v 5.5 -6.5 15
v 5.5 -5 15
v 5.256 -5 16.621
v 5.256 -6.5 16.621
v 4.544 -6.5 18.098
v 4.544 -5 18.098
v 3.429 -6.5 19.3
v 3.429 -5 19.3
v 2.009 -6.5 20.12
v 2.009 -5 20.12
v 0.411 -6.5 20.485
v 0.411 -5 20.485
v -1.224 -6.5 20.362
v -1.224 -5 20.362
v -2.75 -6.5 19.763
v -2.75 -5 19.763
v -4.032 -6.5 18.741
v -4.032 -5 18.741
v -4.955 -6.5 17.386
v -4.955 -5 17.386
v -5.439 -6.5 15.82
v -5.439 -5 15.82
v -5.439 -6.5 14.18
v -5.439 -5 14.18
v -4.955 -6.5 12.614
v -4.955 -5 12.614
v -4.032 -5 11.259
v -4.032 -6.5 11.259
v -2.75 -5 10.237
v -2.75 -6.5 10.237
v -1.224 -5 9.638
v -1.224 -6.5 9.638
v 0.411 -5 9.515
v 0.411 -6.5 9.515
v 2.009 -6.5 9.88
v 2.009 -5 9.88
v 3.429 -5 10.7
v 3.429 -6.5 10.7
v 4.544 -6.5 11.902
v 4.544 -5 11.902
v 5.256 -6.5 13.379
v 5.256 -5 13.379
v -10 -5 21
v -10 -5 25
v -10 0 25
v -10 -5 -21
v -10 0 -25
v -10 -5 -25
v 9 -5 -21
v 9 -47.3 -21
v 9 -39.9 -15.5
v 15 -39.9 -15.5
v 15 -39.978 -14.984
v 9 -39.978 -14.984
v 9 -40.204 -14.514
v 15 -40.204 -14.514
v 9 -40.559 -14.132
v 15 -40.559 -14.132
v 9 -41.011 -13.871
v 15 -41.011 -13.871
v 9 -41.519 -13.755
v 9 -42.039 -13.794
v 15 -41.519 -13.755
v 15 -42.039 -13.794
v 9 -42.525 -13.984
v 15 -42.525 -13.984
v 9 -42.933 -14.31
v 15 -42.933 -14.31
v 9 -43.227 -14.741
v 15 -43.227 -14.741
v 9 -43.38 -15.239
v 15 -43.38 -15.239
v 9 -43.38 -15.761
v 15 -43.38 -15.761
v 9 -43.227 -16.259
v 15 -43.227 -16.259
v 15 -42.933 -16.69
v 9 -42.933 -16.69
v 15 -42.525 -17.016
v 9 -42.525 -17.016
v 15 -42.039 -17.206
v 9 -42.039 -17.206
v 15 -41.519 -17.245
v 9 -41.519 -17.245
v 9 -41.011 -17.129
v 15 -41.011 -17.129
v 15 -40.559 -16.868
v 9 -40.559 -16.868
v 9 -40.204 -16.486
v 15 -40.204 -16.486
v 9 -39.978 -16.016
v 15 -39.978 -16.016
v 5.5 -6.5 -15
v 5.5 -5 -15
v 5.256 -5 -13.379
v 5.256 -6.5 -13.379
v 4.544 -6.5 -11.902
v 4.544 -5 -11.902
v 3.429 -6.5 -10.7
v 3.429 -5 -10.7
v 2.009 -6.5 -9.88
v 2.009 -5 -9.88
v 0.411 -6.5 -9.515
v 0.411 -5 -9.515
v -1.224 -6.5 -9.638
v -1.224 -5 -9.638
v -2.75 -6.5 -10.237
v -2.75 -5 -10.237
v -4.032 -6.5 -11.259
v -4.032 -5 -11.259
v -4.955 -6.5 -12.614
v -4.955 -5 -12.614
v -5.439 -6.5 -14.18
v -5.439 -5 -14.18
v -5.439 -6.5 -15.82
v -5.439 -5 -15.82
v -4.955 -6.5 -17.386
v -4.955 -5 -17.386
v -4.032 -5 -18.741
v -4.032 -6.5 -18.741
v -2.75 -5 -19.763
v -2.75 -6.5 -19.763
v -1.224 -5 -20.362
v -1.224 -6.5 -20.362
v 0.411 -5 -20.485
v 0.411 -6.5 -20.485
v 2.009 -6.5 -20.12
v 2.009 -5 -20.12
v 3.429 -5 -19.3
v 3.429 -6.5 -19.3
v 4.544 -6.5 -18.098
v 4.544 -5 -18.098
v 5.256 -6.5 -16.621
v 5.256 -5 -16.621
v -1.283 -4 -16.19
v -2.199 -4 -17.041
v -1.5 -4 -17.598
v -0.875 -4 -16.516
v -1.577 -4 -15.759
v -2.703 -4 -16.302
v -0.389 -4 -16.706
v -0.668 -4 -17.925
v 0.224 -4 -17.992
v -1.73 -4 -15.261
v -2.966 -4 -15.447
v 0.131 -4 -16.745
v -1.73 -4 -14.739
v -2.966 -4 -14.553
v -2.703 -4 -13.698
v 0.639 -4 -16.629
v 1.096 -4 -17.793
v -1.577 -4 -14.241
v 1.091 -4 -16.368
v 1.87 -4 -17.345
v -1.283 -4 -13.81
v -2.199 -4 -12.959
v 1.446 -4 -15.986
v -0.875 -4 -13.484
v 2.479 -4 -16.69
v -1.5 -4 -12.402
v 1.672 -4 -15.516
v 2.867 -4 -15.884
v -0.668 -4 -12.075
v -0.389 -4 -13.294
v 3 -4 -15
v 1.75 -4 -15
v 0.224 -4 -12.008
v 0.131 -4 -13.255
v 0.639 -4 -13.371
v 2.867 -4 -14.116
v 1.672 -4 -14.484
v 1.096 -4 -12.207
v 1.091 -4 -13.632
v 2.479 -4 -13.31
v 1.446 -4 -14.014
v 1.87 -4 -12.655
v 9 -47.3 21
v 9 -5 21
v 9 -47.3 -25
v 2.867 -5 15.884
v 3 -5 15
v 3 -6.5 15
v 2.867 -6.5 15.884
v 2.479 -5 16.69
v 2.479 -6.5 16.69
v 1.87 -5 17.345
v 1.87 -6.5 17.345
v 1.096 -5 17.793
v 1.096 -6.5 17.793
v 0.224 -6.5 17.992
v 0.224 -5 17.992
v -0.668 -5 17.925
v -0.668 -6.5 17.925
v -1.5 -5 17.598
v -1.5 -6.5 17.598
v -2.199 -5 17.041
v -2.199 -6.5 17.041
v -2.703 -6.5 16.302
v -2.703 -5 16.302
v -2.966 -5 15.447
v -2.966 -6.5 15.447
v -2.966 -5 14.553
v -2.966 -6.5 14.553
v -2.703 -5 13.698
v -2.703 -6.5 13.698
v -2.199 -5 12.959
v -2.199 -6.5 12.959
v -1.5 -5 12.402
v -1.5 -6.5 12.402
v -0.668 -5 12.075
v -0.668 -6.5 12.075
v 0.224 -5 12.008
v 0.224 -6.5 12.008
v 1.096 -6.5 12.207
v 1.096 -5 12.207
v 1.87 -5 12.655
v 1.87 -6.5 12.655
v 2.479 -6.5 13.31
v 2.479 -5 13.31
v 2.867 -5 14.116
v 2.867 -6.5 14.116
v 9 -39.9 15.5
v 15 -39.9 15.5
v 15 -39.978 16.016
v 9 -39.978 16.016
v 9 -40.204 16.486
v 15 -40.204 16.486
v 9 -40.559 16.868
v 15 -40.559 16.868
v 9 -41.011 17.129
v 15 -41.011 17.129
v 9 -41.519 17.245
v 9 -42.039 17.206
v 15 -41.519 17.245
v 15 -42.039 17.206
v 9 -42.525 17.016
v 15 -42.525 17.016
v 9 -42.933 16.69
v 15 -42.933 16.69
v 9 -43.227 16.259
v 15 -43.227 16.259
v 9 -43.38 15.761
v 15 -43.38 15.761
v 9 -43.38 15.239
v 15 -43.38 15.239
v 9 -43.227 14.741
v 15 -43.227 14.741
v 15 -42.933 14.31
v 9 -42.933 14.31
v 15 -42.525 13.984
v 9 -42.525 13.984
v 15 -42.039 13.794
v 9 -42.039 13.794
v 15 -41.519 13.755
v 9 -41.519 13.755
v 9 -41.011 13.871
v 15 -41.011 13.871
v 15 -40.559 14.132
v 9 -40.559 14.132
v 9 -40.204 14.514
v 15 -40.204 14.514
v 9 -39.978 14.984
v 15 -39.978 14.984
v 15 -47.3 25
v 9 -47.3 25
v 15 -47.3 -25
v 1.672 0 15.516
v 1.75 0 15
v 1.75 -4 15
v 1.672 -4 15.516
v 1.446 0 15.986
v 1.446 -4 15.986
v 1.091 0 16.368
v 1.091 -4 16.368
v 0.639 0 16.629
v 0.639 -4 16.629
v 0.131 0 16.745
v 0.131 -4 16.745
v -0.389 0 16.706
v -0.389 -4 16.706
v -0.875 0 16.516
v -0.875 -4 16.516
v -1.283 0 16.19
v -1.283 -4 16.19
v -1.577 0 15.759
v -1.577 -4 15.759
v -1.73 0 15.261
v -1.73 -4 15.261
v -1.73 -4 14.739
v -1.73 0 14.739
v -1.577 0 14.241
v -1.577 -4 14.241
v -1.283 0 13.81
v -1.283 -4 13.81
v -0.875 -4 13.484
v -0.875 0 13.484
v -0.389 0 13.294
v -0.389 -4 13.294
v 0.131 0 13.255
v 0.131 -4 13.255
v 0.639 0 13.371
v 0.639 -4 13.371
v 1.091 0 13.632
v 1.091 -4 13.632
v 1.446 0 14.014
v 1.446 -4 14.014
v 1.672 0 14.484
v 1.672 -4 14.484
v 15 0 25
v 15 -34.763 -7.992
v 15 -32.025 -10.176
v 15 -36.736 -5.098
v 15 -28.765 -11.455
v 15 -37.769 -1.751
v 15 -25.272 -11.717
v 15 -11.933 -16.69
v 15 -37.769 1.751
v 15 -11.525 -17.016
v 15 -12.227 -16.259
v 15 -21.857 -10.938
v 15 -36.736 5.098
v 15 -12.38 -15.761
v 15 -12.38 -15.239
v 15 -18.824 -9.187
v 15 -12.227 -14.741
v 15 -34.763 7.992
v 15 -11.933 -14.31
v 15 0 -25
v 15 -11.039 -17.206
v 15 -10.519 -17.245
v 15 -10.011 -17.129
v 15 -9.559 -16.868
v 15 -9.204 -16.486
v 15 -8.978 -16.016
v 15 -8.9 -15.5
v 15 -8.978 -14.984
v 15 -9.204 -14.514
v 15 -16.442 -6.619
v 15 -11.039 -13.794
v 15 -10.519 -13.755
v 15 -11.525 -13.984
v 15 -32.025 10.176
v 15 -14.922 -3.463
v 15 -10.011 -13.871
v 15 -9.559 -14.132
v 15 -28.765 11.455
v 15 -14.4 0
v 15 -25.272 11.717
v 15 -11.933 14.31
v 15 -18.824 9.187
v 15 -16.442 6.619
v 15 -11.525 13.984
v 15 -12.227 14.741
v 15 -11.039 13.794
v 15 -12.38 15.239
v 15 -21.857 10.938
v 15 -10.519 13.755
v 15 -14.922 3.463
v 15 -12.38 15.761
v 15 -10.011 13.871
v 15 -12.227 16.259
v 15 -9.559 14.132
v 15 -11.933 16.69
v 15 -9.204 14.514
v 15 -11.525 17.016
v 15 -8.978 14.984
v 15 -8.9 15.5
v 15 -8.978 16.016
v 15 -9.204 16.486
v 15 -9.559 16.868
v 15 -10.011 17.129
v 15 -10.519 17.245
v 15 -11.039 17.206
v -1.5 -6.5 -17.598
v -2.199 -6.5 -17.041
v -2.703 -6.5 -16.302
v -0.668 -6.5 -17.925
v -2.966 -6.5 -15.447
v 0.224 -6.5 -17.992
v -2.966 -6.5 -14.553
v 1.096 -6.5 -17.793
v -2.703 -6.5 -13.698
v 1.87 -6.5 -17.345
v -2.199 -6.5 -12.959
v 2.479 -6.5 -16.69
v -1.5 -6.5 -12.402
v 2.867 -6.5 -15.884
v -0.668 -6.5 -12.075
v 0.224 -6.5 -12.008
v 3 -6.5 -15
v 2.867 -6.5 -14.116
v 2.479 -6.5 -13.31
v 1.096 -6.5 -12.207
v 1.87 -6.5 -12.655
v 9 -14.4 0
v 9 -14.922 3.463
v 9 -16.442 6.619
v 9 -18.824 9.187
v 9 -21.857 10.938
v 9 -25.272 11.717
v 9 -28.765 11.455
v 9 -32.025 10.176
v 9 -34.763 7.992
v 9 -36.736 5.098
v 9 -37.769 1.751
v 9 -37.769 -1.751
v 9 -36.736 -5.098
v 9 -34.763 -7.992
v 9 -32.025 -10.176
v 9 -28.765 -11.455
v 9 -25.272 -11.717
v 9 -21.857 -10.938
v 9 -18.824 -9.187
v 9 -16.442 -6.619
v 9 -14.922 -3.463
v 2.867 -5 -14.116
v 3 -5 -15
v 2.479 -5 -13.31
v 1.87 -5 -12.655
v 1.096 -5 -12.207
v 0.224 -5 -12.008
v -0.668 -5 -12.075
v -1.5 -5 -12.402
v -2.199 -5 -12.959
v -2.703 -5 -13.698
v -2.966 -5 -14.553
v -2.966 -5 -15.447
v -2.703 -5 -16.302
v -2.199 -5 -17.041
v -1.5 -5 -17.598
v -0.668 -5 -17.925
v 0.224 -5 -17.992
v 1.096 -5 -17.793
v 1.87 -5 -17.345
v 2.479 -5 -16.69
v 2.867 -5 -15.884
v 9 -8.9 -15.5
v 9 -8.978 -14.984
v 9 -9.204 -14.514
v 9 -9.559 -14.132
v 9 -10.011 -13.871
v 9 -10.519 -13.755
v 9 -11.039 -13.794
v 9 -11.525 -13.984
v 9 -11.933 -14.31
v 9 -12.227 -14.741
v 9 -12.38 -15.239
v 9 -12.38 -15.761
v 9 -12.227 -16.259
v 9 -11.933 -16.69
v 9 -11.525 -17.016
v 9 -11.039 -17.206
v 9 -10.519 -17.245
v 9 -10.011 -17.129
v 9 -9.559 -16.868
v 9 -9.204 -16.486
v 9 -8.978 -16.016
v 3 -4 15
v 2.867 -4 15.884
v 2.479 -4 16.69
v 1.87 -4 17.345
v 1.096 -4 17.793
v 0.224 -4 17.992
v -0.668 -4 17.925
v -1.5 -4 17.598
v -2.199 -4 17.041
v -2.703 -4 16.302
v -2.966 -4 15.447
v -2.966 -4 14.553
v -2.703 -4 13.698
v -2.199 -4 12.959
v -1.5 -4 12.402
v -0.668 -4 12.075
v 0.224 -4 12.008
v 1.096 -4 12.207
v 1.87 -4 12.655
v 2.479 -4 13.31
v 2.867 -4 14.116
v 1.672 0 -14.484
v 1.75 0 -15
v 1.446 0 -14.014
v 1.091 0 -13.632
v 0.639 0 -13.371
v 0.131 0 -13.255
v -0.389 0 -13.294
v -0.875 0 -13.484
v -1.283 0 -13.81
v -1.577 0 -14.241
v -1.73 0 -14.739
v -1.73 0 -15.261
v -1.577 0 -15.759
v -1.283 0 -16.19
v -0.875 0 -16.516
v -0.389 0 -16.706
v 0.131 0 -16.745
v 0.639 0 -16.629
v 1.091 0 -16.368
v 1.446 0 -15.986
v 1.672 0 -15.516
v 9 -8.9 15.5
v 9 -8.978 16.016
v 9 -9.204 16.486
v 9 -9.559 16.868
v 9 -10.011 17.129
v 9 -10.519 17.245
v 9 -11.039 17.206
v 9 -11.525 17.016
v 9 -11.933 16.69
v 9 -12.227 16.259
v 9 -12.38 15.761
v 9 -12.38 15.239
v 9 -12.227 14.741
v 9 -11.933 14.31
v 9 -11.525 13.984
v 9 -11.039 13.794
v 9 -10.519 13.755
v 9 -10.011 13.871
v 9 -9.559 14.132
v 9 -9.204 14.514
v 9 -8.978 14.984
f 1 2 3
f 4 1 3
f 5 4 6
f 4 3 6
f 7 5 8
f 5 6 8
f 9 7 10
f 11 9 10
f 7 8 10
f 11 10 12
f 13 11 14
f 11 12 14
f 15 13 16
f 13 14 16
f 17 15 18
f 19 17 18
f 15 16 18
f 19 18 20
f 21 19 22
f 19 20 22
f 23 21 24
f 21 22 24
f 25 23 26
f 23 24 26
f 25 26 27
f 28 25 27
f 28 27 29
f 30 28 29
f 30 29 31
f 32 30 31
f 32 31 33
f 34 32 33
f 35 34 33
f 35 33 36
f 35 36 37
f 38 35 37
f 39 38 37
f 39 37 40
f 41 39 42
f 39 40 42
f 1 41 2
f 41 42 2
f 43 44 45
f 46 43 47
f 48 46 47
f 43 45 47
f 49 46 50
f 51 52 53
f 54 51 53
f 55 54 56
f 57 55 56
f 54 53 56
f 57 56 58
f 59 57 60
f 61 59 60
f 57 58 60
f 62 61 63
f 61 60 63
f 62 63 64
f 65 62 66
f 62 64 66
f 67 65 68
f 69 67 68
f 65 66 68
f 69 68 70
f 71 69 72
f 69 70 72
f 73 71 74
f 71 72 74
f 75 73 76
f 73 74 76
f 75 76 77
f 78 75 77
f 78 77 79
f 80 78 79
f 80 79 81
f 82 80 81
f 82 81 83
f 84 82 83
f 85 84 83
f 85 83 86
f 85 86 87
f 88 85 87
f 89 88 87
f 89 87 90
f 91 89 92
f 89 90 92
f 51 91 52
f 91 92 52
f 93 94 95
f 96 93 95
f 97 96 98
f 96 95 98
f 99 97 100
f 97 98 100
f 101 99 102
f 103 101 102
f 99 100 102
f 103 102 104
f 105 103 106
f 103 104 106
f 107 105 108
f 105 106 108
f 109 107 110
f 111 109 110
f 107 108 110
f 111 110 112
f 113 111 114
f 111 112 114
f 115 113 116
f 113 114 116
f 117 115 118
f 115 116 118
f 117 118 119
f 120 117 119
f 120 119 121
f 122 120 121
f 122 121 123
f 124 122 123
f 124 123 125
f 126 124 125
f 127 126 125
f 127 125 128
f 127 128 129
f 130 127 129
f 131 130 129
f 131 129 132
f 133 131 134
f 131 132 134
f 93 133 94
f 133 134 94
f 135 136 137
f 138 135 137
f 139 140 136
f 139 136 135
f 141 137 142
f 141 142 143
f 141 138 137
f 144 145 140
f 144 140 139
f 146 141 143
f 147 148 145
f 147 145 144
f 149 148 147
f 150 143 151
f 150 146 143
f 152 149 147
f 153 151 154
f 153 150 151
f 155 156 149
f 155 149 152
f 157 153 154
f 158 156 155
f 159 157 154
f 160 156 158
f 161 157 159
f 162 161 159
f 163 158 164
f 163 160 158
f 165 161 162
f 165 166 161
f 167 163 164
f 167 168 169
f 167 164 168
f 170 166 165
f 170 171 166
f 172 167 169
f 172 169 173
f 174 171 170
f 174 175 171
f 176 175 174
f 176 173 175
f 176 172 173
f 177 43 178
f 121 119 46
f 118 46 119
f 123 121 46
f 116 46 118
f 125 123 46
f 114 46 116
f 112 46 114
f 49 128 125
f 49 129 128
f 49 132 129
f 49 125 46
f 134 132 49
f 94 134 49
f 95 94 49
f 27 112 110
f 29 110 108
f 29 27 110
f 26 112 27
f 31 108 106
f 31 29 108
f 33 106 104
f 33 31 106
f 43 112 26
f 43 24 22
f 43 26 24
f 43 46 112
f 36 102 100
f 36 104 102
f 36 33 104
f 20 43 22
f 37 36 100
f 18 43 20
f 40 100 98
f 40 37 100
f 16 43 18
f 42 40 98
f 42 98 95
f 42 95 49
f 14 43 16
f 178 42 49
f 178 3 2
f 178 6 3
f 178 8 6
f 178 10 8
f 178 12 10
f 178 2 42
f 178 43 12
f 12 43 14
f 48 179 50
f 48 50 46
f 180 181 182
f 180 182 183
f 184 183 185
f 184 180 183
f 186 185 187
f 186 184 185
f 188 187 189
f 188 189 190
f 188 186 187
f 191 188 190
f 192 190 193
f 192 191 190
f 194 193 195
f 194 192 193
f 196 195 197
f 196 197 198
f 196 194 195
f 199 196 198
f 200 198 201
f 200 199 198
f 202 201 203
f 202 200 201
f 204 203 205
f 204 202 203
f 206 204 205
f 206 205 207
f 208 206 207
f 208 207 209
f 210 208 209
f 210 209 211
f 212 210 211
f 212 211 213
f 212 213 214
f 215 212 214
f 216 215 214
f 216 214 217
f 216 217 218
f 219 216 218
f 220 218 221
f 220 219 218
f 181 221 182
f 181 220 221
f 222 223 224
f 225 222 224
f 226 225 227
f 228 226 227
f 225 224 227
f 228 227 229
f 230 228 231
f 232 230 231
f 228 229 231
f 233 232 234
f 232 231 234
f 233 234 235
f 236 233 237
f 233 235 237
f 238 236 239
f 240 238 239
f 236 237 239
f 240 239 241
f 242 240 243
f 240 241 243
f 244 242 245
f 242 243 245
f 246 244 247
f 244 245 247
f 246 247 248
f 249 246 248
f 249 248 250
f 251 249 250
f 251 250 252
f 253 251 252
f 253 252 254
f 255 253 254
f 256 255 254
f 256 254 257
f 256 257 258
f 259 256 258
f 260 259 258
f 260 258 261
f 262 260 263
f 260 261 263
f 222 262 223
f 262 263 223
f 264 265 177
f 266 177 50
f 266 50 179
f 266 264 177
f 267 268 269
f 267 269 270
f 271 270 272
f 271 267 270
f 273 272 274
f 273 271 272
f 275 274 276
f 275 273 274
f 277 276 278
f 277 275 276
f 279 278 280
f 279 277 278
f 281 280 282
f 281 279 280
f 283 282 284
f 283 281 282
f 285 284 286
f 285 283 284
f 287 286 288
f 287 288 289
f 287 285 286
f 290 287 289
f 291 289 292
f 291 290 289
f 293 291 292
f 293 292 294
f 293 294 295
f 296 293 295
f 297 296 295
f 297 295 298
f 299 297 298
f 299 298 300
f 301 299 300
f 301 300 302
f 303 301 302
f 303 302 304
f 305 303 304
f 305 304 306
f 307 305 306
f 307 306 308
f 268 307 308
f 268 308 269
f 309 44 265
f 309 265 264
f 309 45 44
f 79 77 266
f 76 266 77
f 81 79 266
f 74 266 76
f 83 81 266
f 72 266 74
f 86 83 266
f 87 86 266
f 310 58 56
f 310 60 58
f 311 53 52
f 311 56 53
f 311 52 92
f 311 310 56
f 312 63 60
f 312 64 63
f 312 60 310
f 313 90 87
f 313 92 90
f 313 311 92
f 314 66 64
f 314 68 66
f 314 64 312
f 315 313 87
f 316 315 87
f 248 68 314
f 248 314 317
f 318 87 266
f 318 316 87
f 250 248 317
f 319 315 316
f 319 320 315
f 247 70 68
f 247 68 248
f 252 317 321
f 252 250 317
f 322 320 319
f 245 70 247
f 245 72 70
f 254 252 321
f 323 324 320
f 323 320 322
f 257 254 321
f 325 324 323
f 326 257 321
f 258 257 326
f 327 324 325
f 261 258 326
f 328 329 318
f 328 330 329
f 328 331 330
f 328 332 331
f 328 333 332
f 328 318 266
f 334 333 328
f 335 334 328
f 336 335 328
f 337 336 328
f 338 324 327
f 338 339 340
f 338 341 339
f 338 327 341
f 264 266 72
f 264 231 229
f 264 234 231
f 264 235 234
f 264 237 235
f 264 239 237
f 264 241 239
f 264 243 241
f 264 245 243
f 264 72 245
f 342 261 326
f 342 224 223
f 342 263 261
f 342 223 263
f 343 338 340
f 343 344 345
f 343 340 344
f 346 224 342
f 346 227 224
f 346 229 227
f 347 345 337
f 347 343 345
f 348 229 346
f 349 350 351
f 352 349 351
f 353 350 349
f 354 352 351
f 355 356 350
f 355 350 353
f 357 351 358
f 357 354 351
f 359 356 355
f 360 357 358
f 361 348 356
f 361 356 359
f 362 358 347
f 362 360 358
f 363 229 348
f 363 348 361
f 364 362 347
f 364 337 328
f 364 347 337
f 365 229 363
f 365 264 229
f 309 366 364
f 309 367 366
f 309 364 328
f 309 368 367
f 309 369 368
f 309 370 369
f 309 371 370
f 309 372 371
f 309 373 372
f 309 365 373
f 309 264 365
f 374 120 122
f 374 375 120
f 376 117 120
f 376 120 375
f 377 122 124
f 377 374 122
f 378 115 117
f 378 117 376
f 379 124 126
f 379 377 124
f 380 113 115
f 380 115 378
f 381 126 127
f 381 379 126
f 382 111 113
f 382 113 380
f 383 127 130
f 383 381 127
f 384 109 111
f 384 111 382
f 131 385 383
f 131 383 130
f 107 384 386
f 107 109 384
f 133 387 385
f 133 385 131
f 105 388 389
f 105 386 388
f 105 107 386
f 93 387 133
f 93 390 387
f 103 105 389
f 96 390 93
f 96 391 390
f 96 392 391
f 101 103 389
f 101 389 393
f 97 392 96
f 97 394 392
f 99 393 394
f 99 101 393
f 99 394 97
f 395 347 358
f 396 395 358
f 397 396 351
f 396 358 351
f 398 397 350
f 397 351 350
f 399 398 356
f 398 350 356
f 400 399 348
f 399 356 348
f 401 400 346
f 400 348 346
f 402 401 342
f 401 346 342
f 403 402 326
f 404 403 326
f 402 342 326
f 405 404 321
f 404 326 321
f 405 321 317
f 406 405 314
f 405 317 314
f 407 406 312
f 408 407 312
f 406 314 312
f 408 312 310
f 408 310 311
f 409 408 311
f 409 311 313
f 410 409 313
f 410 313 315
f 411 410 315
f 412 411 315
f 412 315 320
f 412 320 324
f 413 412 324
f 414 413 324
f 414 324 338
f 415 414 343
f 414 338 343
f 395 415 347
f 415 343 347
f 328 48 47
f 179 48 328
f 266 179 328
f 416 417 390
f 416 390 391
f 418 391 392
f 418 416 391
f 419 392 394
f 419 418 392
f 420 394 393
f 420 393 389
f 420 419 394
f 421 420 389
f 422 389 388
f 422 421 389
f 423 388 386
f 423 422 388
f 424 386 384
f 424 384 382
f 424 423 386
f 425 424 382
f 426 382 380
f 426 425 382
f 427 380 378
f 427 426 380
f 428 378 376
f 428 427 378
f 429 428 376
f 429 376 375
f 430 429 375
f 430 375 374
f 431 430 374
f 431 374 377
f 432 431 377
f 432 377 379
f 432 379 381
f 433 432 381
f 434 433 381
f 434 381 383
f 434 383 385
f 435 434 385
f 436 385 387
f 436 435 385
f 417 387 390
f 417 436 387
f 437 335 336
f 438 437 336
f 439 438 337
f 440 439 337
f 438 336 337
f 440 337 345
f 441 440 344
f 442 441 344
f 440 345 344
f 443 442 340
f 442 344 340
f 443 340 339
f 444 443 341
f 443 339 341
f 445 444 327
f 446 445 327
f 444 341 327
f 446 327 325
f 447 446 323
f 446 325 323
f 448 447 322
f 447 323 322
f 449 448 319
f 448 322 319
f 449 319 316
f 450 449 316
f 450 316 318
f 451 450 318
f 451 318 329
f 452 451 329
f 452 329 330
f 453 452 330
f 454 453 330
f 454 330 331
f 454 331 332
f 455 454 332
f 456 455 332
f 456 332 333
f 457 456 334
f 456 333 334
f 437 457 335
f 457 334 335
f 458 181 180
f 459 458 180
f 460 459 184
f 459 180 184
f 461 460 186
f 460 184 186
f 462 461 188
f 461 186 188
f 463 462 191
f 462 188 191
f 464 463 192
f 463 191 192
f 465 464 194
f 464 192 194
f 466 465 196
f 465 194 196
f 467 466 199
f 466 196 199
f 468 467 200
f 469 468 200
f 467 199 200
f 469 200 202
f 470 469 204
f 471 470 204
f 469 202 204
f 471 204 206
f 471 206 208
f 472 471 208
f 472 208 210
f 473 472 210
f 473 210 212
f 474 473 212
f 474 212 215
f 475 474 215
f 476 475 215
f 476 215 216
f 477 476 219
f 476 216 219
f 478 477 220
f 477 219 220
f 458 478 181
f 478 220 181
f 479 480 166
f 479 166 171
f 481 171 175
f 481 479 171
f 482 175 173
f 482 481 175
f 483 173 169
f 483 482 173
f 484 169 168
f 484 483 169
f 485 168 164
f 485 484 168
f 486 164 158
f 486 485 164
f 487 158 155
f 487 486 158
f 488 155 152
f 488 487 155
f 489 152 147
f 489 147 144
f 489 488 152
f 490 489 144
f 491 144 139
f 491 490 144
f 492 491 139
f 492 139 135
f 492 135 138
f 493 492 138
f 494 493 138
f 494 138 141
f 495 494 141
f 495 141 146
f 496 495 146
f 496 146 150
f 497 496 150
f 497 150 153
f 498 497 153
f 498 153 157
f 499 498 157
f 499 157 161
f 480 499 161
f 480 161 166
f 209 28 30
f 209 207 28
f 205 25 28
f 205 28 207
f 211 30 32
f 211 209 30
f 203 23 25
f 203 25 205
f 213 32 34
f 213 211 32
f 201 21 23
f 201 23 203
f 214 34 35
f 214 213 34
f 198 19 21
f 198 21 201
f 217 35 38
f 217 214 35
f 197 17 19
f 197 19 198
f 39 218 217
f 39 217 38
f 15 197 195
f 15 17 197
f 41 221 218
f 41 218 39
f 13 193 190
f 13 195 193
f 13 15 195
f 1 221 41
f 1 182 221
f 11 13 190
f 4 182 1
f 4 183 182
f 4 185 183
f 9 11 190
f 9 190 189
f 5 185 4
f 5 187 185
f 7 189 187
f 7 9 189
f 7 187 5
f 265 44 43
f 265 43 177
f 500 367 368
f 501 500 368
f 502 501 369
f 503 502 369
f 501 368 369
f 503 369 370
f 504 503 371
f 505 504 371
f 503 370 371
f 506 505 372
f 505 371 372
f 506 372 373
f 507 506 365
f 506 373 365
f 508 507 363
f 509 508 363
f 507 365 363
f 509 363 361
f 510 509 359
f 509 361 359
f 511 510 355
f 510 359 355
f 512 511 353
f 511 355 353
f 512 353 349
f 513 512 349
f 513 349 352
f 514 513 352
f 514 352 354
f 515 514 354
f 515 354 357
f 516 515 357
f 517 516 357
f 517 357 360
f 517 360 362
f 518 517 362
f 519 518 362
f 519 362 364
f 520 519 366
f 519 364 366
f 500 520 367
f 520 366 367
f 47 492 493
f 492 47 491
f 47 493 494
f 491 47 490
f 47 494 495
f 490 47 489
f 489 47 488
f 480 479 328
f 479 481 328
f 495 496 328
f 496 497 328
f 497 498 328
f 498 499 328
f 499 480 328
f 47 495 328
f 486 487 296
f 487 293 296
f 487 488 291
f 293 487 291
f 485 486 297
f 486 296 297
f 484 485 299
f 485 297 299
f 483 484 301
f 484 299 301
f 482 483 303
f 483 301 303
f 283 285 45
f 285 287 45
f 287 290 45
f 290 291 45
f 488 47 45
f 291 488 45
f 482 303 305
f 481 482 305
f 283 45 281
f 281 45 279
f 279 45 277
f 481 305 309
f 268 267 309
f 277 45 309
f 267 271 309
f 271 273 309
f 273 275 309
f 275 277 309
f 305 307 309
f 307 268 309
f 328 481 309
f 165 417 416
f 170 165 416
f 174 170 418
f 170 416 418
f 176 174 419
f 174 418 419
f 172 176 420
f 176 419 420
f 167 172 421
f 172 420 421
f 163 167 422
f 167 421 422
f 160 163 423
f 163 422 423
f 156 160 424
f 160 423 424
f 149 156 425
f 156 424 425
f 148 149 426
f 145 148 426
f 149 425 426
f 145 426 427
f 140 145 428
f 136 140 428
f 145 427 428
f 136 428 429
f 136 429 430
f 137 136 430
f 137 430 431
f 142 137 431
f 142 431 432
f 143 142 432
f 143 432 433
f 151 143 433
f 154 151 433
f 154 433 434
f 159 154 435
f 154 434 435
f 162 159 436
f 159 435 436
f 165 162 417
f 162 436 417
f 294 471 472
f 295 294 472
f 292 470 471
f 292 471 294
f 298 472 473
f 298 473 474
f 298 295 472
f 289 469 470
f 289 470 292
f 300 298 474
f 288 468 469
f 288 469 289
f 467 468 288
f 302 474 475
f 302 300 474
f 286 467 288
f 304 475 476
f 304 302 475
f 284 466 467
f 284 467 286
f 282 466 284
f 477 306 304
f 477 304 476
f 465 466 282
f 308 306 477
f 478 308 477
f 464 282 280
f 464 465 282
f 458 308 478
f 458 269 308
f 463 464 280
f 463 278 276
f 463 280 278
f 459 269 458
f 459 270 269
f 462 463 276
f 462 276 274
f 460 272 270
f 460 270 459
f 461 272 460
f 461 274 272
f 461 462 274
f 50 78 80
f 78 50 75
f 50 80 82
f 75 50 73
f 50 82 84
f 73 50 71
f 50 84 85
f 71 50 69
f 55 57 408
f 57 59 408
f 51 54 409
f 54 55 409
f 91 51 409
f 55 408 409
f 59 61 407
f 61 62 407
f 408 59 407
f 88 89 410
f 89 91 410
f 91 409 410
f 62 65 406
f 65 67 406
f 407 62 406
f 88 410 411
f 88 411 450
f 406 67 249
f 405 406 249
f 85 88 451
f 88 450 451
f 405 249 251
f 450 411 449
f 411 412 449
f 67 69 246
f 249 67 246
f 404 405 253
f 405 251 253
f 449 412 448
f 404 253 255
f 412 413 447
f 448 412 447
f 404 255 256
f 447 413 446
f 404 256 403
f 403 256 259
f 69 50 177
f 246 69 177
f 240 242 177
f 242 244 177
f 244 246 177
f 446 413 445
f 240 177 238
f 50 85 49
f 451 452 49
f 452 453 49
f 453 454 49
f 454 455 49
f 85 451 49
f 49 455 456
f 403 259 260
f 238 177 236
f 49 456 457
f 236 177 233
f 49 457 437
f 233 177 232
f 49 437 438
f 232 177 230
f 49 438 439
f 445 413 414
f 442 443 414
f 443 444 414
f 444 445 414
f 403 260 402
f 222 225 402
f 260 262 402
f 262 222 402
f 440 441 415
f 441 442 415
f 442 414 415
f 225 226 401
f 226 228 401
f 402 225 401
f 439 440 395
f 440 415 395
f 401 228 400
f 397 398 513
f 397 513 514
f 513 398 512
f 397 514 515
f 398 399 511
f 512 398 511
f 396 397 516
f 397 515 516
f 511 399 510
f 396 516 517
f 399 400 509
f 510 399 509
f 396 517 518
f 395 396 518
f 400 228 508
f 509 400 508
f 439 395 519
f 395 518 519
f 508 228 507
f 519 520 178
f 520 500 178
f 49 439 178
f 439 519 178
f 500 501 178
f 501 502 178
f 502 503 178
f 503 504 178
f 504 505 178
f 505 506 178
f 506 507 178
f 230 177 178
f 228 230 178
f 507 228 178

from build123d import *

# Parameters (mm, degrees)
F0_R      = 1.75
F1_DEPTH  = 5
F2_R      = 1.75
F2_R_2    = 11.75
F3_DEPTH  = 6
F5_DEPTH  = 4
F7_DEPTH  = 4
F8_R      = 5.5
F8_R_2    = 3
F9_DEPTH  = 1.5
F10_DEPTH = 1


with BuildPart() as f1:
    # F0 (on Front) → F1 (new body)
    with BuildSketch(Plane.XZ):
        Polygon((15, 25), (-10, 25), (-10, 0), (-10, -25), (15, -25), align=None)
        with Locations((0, -15)):
            Circle(F0_R, mode=Mode.SUBTRACT)
        with Locations((0, 15)):
            Circle(F0_R, mode=Mode.SUBTRACT)
    extrude(amount=F1_DEPTH)

    # F2 (on face) → F3 (join)
    with BuildSketch(Plane.YZ.offset(15)):
        Polygon((-5, 25), (-47.3, 25), (-47.3, -25), (-5, -25), (-5, 0), align=None)
        with Locations((-41.65, -15.5)):
            Circle(F2_R, mode=Mode.SUBTRACT)
        with Locations((-10.65, -15.5)):
            Circle(F2_R, mode=Mode.SUBTRACT)
        with Locations((-41.65, 15.5)):
            Circle(F2_R, mode=Mode.SUBTRACT)
        with Locations((-26.15, 0)):
            Circle(F2_R_2, mode=Mode.SUBTRACT)
        with Locations((-10.65, 15.5)):
            Circle(F2_R, mode=Mode.SUBTRACT)
    extrude(amount=-F3_DEPTH)

    # F4 (on face) → F5 (join)
    with BuildSketch(Plane(origin=(0, 0, -25), x_dir=(1, 0, 0), z_dir=(0, 0, -1))):
        Polygon((9, 47.3), (-10, 5), (9, 5), align=None)
    extrude(amount=-F5_DEPTH)

    # F6 (on face) → F7 (join)
    with BuildSketch(Plane.XY.offset(25)):
        Polygon((-10, -5), (9, -47.3), (9, -5), align=None)
    extrude(amount=-F7_DEPTH)

    # F8 (on face) → F9 (join)
    with BuildSketch(Plane.XZ.offset(5)):
        with Locations((0, 15)):
            Circle(F8_R)
        with Locations((0, 15)):
            Circle(F8_R_2, mode=Mode.SUBTRACT)
        with Locations((0, -15)):
            Circle(F8_R)
        with Locations((0, -15)):
            Circle(F8_R_2, mode=Mode.SUBTRACT)
    extrude(amount=F9_DEPTH)

    # F10 (cut): faces of the model
    f10_faces = [f1.faces().sort_by_distance(p)[0] for p in [
        (-2.9151471863, -5, 15),
        (-2.9151471863, -5, -15),
    ]]
    extrude(f10_faces, amount=-F10_DEPTH, mode=Mode.SUBTRACT)


solid = f1.part
